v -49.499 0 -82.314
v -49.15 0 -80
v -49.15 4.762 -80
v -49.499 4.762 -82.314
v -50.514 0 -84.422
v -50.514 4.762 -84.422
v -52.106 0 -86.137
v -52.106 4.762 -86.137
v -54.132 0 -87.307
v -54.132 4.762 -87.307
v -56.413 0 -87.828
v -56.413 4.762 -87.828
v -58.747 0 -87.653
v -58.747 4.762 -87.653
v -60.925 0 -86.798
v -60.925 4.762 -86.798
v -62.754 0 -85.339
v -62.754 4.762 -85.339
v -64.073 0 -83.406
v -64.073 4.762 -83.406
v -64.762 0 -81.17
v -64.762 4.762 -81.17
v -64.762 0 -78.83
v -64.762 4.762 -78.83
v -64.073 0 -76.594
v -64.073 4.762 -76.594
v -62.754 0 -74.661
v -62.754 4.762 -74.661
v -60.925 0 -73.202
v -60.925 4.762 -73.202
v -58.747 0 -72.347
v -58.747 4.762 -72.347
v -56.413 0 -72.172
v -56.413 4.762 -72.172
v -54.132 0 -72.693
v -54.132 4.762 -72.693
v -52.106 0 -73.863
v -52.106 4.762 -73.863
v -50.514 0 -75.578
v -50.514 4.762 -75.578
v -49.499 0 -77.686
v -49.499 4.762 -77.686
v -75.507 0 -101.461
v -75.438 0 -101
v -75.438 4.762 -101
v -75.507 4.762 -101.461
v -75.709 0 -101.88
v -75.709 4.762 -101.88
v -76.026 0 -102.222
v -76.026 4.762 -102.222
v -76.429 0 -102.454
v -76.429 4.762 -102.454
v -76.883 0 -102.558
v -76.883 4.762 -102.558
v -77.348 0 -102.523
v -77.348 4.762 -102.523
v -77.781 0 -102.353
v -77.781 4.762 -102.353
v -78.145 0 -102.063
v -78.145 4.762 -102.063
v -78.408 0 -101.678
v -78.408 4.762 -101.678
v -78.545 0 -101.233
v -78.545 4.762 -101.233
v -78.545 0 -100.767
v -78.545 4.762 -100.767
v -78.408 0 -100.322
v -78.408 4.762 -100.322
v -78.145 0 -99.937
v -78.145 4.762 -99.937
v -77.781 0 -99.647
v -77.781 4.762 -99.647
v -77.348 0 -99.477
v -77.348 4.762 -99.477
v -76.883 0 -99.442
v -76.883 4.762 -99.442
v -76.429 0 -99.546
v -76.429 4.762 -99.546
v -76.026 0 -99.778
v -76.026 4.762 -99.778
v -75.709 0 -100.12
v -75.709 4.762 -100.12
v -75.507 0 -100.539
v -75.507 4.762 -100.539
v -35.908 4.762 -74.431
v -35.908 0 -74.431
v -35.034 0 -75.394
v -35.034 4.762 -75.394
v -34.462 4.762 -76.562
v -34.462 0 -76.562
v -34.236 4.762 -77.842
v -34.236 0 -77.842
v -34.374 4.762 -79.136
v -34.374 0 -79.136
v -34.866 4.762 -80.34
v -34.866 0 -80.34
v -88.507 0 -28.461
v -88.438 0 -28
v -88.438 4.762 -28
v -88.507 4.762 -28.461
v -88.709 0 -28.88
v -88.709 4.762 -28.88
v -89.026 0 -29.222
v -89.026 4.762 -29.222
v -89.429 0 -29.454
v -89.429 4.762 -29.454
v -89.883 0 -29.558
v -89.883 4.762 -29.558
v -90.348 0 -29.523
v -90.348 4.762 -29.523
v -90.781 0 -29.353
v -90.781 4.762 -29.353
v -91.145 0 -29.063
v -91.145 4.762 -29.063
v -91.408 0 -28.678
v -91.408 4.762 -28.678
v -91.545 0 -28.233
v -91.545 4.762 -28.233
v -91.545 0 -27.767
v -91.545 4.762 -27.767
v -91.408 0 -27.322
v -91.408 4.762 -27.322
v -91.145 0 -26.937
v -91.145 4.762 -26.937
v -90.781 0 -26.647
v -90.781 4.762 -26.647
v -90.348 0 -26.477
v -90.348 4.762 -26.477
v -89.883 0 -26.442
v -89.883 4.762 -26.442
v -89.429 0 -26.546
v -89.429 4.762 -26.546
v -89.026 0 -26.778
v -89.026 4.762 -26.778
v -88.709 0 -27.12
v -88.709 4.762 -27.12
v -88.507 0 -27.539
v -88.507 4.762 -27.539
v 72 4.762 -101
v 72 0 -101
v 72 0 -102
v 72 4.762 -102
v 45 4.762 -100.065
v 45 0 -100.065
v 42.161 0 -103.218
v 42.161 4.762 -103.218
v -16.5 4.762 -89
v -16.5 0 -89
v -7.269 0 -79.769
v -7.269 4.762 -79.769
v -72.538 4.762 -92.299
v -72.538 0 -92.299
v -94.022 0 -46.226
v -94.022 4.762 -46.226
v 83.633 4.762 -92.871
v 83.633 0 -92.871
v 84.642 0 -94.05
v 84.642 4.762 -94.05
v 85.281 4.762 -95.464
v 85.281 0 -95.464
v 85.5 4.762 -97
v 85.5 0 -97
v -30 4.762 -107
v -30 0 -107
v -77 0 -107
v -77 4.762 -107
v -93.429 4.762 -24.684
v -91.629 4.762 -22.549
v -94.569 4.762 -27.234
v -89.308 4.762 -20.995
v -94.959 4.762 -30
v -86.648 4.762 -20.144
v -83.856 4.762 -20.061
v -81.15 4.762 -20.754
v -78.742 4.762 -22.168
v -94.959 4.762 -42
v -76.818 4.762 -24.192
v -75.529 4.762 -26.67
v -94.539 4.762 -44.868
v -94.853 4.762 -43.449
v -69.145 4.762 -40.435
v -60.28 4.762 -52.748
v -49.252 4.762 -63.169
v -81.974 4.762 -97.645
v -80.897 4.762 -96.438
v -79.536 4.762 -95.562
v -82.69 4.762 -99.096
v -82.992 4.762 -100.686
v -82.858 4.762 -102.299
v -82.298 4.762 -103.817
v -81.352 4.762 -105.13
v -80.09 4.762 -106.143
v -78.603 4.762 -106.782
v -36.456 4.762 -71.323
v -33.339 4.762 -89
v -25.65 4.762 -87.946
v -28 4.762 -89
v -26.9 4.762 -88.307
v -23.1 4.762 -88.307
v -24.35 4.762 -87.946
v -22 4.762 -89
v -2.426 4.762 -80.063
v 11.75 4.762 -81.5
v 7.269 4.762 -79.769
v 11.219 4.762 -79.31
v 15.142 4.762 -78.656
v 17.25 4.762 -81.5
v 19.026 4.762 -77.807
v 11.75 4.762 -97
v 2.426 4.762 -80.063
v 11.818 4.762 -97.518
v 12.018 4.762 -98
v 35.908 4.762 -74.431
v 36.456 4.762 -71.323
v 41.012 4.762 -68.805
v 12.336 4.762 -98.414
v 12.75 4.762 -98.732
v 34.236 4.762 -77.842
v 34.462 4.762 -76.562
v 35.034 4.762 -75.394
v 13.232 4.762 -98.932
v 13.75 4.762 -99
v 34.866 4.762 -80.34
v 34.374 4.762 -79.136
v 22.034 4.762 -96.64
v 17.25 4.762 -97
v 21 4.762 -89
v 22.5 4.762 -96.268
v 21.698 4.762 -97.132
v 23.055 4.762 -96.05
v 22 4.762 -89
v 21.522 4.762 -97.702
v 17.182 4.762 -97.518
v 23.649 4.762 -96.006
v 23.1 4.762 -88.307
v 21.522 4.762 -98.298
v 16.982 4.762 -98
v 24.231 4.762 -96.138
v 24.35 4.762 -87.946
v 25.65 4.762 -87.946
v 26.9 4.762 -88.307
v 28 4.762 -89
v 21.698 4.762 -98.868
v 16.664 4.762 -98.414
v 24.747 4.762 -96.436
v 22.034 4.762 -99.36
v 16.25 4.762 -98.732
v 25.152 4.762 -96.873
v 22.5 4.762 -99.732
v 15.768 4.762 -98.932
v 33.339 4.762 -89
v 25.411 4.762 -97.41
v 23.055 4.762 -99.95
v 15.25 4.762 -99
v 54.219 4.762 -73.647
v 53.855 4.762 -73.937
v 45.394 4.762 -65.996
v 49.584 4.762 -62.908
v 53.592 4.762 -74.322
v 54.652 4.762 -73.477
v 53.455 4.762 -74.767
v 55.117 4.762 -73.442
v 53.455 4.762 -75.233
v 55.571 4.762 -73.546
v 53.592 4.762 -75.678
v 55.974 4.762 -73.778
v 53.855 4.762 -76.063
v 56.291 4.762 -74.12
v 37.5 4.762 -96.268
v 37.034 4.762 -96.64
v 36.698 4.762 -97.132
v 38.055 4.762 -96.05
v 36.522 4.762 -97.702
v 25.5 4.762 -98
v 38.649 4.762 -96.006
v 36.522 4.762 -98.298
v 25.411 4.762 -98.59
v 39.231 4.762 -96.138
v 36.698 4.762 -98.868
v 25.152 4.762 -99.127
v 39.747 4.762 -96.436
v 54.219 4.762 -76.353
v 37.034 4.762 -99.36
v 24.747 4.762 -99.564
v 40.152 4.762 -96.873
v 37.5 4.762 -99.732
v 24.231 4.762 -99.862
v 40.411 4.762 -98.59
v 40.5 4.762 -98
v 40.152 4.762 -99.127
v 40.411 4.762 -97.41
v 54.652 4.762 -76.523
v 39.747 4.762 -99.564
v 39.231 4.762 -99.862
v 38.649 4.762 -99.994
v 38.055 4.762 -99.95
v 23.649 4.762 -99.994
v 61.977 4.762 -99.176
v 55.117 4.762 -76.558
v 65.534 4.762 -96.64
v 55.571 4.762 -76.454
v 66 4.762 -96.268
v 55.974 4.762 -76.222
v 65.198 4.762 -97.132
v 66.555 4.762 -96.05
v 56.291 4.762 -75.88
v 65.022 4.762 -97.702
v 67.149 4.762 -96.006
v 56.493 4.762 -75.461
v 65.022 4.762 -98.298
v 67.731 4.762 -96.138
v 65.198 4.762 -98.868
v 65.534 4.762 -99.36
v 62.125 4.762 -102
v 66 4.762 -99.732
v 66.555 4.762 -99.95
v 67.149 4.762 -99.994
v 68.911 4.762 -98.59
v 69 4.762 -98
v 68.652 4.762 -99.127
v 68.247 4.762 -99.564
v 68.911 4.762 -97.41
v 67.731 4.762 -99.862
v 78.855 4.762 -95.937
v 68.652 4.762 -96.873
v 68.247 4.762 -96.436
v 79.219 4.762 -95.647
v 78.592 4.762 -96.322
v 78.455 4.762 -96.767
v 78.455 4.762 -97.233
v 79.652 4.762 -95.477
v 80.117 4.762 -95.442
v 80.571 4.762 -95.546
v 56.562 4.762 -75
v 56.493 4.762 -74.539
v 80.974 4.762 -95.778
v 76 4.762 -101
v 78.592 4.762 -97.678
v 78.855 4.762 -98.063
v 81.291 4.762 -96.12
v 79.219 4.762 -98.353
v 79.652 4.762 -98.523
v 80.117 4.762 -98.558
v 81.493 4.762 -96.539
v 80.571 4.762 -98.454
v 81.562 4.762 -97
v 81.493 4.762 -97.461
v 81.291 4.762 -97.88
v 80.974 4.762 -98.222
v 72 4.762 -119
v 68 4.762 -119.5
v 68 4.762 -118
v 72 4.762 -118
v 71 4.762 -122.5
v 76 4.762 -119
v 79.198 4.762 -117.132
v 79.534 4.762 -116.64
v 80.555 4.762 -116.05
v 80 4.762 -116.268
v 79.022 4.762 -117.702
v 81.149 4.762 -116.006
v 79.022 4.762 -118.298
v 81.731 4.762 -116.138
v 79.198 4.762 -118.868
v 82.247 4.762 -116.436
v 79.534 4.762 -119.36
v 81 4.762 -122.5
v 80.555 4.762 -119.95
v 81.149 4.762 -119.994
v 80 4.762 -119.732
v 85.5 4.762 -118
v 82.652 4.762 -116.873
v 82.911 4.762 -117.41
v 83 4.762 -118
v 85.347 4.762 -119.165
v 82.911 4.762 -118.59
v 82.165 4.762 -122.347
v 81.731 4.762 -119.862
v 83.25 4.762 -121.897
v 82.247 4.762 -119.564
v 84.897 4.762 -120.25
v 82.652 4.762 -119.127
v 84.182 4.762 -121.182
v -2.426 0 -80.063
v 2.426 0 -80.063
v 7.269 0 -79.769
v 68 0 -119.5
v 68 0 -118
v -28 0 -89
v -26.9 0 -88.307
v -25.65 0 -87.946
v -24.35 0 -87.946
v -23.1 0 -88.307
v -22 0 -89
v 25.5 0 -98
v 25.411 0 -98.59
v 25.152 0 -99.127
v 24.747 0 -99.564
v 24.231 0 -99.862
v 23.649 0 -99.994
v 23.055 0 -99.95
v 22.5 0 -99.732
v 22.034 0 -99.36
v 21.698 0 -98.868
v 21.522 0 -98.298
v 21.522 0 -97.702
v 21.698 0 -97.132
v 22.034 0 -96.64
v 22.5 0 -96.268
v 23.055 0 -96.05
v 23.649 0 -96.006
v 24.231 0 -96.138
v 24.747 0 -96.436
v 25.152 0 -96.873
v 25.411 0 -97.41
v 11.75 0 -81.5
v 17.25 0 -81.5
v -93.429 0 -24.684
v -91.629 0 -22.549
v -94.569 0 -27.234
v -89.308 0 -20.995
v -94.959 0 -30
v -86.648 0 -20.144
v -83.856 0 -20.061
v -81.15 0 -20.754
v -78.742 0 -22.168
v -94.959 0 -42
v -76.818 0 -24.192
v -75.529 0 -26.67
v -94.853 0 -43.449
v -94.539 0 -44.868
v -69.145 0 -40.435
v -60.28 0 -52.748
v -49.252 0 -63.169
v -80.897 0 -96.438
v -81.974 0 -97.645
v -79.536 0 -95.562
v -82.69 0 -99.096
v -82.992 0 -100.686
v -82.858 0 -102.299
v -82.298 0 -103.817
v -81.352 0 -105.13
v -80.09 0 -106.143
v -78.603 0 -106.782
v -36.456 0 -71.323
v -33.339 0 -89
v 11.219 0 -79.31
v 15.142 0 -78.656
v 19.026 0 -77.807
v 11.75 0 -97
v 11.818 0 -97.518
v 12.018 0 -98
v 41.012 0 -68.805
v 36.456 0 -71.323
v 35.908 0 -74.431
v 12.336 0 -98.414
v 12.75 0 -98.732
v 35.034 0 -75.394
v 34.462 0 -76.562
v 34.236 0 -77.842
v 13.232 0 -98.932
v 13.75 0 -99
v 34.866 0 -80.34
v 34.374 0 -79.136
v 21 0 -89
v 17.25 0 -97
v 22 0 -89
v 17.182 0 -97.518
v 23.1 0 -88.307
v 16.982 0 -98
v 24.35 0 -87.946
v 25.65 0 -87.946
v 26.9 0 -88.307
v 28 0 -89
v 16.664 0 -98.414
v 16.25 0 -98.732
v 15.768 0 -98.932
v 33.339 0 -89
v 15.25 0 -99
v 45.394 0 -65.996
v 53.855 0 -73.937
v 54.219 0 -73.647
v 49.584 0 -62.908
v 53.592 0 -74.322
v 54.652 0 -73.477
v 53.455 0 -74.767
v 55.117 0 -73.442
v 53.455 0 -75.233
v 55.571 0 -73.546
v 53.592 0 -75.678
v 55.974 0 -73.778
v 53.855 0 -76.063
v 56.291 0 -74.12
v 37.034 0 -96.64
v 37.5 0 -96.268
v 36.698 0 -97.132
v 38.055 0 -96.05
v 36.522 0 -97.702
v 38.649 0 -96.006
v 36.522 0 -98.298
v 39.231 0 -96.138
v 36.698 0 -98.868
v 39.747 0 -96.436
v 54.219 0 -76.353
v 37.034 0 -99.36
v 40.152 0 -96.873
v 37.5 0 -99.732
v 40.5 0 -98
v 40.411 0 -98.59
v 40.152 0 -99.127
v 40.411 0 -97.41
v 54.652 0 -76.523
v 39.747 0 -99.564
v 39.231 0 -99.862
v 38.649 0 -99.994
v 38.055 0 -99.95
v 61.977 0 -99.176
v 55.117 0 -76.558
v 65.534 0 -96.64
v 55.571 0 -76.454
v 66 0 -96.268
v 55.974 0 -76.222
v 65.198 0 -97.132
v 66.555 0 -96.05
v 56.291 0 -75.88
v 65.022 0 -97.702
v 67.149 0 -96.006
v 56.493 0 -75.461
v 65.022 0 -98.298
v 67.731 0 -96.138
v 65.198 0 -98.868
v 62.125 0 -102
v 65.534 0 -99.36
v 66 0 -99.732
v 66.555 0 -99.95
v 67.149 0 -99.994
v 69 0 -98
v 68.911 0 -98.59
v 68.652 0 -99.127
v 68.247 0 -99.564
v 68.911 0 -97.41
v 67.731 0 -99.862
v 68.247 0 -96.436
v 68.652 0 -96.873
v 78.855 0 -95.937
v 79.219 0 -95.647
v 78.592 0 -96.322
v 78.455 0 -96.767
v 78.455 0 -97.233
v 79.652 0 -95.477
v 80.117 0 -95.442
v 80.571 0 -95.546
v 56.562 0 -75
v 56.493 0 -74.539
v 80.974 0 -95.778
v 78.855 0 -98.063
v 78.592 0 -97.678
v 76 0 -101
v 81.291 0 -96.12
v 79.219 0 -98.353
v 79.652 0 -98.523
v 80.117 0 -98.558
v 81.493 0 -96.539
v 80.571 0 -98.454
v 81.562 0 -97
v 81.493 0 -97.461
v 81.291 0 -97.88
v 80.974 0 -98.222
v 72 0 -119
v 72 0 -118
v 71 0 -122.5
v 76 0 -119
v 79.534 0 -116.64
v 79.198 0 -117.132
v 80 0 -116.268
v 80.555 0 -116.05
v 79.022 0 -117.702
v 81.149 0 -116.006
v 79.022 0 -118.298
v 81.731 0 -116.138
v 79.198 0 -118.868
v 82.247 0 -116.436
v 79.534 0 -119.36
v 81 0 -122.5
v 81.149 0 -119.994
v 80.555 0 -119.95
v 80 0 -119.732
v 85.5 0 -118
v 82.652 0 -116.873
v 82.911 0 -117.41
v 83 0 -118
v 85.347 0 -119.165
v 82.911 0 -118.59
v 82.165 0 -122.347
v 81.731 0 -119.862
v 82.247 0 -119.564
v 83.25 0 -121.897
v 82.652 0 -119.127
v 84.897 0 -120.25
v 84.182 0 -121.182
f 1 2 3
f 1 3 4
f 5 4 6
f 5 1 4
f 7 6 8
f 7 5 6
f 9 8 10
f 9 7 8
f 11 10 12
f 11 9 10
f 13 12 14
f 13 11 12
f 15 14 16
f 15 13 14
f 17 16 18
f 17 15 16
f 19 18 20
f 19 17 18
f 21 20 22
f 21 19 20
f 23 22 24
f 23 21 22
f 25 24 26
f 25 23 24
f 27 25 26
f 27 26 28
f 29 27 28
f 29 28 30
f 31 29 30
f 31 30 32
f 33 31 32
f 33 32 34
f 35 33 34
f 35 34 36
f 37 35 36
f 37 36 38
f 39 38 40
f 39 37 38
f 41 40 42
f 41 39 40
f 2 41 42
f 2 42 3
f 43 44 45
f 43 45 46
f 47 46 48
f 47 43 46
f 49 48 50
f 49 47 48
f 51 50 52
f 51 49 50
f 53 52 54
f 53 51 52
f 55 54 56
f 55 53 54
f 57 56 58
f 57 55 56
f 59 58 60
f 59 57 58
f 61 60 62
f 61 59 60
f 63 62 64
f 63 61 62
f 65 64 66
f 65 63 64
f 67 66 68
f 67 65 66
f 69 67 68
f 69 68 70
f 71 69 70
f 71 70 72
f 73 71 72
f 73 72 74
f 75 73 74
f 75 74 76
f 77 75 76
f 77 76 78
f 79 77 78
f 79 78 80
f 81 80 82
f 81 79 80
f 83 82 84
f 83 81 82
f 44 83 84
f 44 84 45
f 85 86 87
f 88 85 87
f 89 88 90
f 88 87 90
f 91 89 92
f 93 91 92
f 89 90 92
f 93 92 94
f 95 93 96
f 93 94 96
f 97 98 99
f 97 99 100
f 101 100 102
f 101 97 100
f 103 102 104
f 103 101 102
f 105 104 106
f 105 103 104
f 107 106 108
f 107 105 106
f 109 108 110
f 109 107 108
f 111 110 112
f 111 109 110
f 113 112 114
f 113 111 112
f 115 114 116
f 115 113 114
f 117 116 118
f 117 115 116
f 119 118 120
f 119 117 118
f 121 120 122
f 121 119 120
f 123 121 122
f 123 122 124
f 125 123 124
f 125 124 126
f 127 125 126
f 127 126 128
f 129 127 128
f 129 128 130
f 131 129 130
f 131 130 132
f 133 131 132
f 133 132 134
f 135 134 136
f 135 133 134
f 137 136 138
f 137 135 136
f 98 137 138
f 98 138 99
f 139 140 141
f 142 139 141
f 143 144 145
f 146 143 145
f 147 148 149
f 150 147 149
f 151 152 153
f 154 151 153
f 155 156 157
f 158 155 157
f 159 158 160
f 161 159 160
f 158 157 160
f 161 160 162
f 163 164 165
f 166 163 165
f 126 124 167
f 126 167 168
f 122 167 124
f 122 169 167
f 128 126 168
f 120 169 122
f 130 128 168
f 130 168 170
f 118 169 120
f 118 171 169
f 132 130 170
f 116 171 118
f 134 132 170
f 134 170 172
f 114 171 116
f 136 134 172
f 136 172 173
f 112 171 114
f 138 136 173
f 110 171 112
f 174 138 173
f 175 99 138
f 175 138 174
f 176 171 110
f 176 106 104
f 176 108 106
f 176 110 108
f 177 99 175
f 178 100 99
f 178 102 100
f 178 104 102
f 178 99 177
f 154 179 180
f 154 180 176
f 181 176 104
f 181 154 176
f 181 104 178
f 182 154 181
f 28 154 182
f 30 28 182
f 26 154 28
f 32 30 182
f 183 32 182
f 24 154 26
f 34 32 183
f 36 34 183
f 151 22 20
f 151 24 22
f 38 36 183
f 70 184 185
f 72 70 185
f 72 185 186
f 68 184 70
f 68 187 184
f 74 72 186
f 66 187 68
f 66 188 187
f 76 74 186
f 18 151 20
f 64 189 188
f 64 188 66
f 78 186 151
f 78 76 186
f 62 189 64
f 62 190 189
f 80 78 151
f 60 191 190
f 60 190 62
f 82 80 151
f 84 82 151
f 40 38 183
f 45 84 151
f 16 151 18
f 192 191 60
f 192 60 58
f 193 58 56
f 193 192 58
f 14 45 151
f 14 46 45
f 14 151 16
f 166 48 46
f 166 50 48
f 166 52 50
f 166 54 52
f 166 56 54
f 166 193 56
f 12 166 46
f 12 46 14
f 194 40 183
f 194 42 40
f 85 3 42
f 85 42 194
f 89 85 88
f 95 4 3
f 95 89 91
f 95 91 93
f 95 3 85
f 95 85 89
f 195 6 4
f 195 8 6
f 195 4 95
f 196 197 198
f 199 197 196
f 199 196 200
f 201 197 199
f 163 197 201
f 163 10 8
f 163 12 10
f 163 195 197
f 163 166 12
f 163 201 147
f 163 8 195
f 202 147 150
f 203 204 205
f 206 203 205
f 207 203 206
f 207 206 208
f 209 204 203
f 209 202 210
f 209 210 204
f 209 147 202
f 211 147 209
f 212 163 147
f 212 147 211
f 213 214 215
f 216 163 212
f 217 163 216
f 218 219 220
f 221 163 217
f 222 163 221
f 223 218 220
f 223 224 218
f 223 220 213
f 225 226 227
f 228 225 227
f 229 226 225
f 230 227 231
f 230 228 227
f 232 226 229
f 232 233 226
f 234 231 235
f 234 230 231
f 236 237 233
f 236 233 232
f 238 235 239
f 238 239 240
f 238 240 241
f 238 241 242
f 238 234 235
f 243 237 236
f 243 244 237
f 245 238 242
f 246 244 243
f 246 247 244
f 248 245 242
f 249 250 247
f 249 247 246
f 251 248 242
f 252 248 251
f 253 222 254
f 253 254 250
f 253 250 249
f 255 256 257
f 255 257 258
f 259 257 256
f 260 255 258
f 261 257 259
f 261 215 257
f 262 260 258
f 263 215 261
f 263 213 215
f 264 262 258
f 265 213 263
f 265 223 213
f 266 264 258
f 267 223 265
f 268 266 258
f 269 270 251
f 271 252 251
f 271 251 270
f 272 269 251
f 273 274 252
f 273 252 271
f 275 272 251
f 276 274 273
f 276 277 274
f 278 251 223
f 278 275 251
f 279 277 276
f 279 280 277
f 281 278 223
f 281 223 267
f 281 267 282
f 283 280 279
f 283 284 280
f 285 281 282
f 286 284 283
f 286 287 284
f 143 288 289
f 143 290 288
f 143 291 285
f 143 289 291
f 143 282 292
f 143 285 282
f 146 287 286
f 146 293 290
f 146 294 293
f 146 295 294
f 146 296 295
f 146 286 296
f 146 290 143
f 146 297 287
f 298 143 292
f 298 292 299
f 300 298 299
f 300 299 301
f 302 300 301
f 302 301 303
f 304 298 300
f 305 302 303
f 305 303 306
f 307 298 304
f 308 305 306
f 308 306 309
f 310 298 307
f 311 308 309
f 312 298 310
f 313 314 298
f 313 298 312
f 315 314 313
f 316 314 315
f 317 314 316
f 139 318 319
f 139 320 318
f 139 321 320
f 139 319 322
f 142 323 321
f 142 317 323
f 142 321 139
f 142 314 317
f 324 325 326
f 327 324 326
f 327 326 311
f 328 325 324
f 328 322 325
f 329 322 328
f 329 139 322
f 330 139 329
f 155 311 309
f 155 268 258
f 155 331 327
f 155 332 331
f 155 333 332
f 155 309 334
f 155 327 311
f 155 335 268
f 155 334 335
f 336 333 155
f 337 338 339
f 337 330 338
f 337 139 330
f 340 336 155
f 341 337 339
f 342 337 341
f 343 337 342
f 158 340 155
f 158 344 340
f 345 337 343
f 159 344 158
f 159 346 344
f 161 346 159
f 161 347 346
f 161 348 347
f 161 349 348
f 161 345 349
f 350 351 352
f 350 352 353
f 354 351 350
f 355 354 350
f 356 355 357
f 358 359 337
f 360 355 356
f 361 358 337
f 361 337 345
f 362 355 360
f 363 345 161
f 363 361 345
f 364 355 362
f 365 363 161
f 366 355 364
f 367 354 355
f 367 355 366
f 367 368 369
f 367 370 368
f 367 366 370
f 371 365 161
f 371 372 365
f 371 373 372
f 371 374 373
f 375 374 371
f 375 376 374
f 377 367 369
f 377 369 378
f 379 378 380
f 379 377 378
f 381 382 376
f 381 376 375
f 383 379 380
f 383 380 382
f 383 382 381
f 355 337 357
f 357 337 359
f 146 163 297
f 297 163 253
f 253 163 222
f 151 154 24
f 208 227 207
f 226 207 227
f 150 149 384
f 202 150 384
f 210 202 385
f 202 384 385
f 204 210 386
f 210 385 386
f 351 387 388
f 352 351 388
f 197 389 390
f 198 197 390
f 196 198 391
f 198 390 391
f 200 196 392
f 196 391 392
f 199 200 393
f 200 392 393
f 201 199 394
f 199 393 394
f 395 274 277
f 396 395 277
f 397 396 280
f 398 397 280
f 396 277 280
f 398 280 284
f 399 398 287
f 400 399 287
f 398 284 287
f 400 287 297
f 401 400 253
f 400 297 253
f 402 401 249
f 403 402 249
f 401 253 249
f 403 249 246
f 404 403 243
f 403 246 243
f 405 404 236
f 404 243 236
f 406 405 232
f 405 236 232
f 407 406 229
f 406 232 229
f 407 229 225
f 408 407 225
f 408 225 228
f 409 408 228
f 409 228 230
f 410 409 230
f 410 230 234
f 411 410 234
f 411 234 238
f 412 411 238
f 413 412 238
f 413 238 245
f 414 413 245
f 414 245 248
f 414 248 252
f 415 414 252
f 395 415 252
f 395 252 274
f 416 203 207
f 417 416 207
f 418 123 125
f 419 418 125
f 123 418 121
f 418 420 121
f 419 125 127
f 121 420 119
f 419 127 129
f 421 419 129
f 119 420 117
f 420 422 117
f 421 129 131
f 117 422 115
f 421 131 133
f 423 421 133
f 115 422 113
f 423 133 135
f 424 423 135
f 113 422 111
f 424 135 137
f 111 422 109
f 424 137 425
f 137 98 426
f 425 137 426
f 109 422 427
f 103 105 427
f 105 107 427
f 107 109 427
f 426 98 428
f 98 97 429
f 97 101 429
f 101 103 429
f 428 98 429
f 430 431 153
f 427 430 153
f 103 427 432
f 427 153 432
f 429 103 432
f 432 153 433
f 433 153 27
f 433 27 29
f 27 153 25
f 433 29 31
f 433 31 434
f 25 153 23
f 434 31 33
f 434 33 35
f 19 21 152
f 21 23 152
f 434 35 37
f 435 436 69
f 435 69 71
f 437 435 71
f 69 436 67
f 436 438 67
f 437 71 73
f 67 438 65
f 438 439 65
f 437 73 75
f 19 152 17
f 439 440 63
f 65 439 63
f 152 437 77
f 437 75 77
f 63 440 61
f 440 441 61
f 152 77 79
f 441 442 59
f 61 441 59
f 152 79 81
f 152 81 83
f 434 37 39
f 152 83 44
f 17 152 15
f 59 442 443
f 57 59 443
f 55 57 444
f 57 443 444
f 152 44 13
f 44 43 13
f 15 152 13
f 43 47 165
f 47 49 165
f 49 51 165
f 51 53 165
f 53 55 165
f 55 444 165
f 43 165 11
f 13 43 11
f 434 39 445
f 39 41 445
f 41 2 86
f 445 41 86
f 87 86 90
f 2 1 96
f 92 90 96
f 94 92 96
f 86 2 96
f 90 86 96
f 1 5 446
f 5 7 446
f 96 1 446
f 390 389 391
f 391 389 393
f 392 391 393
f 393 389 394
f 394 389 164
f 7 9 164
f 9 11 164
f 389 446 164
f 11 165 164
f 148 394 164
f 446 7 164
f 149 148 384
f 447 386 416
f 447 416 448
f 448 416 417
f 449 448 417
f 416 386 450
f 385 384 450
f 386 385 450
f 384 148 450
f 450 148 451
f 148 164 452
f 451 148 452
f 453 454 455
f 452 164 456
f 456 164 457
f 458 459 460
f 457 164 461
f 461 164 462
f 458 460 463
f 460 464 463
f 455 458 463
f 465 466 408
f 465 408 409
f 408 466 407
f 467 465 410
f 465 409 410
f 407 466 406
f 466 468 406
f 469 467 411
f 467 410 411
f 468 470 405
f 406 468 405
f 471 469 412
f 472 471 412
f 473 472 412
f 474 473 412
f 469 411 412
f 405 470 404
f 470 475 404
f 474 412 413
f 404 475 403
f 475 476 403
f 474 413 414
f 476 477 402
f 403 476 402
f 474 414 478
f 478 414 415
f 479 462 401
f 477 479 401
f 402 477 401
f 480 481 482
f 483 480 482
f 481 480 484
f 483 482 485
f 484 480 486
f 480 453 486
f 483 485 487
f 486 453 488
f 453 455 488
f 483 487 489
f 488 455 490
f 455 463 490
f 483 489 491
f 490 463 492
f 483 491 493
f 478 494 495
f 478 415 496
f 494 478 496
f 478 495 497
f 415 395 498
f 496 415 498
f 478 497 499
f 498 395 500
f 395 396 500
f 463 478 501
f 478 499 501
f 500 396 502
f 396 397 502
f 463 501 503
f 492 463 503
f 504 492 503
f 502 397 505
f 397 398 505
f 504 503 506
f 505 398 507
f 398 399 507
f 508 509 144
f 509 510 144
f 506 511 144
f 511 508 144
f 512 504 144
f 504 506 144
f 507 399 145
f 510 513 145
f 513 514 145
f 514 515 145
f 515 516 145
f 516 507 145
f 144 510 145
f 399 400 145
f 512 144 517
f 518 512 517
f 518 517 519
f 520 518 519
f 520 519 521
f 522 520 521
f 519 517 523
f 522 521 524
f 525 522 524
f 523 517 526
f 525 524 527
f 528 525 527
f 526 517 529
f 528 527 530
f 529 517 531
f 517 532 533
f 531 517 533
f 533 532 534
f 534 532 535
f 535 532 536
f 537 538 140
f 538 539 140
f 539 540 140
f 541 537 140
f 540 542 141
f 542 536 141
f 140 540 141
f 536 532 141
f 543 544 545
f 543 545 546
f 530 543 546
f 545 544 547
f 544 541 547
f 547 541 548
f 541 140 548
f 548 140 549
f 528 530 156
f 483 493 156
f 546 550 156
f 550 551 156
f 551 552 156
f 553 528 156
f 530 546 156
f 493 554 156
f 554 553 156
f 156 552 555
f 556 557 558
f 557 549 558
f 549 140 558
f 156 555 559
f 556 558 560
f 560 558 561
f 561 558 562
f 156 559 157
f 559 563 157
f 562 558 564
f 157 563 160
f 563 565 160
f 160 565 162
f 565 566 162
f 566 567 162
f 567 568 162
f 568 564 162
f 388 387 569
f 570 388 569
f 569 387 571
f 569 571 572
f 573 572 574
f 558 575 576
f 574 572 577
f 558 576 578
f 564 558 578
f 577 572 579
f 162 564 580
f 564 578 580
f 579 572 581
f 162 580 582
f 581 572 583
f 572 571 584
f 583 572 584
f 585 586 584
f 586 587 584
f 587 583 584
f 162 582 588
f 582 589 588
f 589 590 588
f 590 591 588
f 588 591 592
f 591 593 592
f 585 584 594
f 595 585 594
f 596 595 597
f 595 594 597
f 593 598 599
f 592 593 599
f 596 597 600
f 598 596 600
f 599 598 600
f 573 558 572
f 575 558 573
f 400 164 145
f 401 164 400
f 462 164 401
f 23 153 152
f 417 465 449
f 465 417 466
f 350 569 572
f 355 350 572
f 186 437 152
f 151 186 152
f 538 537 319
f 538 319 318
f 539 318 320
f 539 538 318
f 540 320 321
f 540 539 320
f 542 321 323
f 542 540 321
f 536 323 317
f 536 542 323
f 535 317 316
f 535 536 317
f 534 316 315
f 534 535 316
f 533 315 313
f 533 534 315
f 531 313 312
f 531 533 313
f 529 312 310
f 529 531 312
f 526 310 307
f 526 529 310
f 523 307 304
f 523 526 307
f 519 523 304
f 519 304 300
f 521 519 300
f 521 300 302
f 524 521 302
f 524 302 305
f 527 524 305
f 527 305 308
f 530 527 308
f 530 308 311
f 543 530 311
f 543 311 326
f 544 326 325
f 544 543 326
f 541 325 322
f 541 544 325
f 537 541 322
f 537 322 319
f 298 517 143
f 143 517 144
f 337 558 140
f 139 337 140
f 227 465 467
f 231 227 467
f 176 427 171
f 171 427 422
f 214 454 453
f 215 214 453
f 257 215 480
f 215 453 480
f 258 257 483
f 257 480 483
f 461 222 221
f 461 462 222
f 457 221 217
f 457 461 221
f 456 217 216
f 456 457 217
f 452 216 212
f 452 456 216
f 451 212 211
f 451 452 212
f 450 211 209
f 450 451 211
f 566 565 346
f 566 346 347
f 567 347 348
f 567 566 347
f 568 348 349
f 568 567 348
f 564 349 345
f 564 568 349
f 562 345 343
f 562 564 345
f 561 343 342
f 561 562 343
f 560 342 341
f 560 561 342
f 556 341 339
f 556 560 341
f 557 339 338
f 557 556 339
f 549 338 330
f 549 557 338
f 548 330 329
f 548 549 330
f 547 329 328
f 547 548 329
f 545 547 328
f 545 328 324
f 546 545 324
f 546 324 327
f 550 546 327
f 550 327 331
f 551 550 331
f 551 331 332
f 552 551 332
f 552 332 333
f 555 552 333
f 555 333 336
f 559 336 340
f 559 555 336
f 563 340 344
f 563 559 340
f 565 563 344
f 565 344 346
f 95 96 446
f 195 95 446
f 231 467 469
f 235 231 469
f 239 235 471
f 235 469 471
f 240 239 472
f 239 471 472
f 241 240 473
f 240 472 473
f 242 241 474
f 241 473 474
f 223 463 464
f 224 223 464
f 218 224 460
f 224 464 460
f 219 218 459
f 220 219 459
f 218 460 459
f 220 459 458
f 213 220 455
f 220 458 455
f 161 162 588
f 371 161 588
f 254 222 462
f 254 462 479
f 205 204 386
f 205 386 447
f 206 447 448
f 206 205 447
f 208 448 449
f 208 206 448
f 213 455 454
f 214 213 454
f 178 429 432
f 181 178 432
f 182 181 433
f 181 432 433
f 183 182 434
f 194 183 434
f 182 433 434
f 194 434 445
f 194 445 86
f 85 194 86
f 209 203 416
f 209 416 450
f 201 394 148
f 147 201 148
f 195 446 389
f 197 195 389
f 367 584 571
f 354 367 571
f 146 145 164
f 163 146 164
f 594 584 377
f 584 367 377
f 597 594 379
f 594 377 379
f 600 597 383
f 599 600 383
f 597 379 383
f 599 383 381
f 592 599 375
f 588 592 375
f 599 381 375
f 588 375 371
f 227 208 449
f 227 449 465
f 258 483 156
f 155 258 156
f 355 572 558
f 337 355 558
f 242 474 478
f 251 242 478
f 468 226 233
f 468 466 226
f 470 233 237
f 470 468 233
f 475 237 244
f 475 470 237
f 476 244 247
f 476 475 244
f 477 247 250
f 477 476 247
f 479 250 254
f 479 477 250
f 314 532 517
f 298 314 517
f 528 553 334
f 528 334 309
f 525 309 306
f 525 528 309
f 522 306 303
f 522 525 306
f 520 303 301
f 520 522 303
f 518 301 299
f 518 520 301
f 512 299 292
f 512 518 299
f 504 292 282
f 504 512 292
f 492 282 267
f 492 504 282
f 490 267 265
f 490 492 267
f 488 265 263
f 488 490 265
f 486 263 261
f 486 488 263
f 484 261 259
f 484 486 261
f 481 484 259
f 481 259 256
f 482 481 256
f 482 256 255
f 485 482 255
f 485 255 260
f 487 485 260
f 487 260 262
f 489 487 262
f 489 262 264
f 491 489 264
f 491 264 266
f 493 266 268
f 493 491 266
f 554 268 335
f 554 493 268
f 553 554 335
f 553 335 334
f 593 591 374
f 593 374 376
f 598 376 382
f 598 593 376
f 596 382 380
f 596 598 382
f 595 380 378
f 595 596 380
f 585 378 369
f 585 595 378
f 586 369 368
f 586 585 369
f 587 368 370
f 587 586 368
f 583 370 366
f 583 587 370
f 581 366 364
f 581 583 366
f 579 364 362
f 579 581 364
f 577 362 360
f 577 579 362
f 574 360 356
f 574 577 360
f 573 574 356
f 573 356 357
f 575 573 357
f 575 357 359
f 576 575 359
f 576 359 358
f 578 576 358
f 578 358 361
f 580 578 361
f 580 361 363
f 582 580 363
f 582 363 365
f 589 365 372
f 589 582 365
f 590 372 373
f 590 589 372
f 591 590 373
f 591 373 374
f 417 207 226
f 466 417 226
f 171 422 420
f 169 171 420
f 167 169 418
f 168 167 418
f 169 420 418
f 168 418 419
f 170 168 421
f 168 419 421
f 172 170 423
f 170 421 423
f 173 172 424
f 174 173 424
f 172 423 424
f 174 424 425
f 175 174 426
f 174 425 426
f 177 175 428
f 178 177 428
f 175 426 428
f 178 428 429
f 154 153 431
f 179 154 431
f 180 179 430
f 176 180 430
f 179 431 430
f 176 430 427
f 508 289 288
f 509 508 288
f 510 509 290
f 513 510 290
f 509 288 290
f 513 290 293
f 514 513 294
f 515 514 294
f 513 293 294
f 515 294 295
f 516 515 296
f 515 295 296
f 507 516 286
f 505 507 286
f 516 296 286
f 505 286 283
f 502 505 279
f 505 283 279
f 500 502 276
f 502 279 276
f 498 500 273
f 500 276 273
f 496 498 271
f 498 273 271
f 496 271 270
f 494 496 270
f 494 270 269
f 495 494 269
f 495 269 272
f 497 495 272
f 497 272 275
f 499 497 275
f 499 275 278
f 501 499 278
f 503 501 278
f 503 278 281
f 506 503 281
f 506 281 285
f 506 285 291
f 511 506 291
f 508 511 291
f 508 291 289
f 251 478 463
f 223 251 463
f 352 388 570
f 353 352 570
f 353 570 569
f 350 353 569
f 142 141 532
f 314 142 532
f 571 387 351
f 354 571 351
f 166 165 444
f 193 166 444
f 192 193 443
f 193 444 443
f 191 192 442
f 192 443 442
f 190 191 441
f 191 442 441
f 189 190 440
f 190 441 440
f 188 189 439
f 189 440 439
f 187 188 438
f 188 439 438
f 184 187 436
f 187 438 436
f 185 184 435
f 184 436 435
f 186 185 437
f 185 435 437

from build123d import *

# Parameters (mm, degrees)
SKETCH1_R           = 7.85
SKETCH1_R_2         = 1.5625
SKETCH1_R_3         = 2
BOSS_EXTRUDE1_DEPTH = 4.7625
BOSS_EXTRUDE2_DEPTH = 4.7625
SKETCH4_R           = 2
SKETCH4_W           = 5.5
SKETCH4_H           = 17.5
CUT_EXTRUDE1_DEPTH  = 5.7625
CHAMFER1_SIZE       = 3
FILLET1_R           = 4.5
FILLET2_R           = 2


with BuildPart() as part:
    # Sketch1 → Boss-Extrude1 (new body)
    with BuildSketch(Plane(origin=(0, 0, 0), x_dir=(1, 0, 0), z_dir=(0, 1, 0))):
        with BuildLine():
            Line((-36.456035166, 71.322980167), (-35.908059548, 74.43070433))
            ThreePointArc((-35.908059548, 74.43070433), (-34.303826486, 77.194114594), (-34.866170482, 80.339550848))
            Line((-34.866170482, 80.339550848), (-33.339099631, 89))
            Line((-33.339099631, 89), (-28, 89))
            ThreePointArc((-28, 89), (-25, 87.9), (-22, 89))
            Line((-22, 89), (-16.5, 89))
            Line((-16.5, 89), (-7.269449675, 79.769449675))
            ThreePointArc((-7.269449675, 79.769449675), (0, 80.1), (7.269449675, 79.769449675))
            Line((7.269449675, 79.769449675), (16.5, 89))
            Line((16.5, 89), (22, 89))
            ThreePointArc((22, 89), (25, 87.9), (28, 89))
            Line((28, 89), (33.339099631, 89))
            Line((33.339099631, 89), (34.866170482, 80.339550848))
            ThreePointArc((34.866170482, 80.339550848), (34.303826486, 77.194114594), (35.908059548, 74.43070433))
            Line((35.908059548, 74.43070433), (36.456035166, 71.322980167))
            ThreePointArc((36.456035166, 71.322980167), (43.225467457, 67.435665364), (49.584363344, 62.907876389))
            Line((49.584363344, 62.907876389), (83.633453422, 92.871075657))
            ThreePointArc((83.633453422, 92.871075657), (85.011686035, 94.734386818), (85.5, 97))
            Line((85.5, 97), (85.5, 122.5))
            Line((85.5, 122.5), (68, 122.5))
            Line((68, 122.5), (68, 118))
            Line((68, 118), (72, 118))
            Line((72, 118), (72, 119))
            Line((72, 119), (76, 119))
            Line((76, 119), (76, 101))
            Line((76, 101), (72, 101))
            Line((72, 101), (72, 102))
            Line((72, 102), (62.124723238, 102))
            Line((62.124723238, 102), (61.976702091, 99.17558826))
            Line((61.976702091, 99.17558826), (45, 100.065299516))
            Line((45, 100.065299516), (42.161119264, 103.218195989))
            Line((42.161119264, 103.218195989), (-30, 107))
            Line((-30, 107), (-77, 107))
            ThreePointArc((-77, 107), (-82.857776043, 102.298637684), (-79.53570957, 95.562153278))
            Line((-79.53570957, 95.562153278), (-72.537844854, 92.29899537))
            Line((-72.537844854, 92.29899537), (-94.021950273, 46.226182617))
            ThreePointArc((-94.021950273, 46.226182617), (-94.721832474, 44.164396139), (-94.958872403, 42))
            Line((-94.958872403, 42), (-94.958872403, 30))
            ThreePointArc((-94.958872403, 30), (-86.647958542, 20.143682837), (-75.5294748, 26.67036626))
            ThreePointArc((-75.5294748, 26.67036626), (-60.279785939, 52.748055957), (-36.456035166, 71.322980167))
        make_face()
        with Locations((-57, 80)):
            Circle(SKETCH1_R, mode=Mode.SUBTRACT)
        with Locations((80, 97)):
            Circle(SKETCH1_R_2, mode=Mode.SUBTRACT)
        with Locations((-90, 28)):
            Circle(SKETCH1_R_2, mode=Mode.SUBTRACT)
        with Locations((-77, 101)):
            Circle(SKETCH1_R_2, mode=Mode.SUBTRACT)
        with Locations((81, 118)):
            Circle(SKETCH1_R_3, mode=Mode.SUBTRACT)
        with Locations((67, 98)):
            Circle(SKETCH1_R_3, mode=Mode.SUBTRACT)
        with Locations((55, 75)):
            Circle(SKETCH1_R_2, mode=Mode.SUBTRACT)
    extrude(amount=BOSS_EXTRUDE1_DEPTH)

    # Sketch2 → Boss-Extrude2 (add)
    with BuildSketch(Plane(origin=(0, 4.7625, 0), x_dir=(1, 0, 0), z_dir=(0, 1, 0))):
        with BuildLine():
            Line((19.026456742, 77.807479999), (21, 89))
            Line((21, 89), (16.5, 89))
            Line((16.5, 89), (7.269449675, 79.769449675))
            ThreePointArc((7.269449675, 79.769449675), (13.184498656, 79.007461642), (19.026456742, 77.807479999))
        make_face()
    extrude(amount=-BOSS_EXTRUDE2_DEPTH)

    # Sketch4 → Cut-Extrude1 (cut, through all)
    with BuildSketch(Plane(origin=(0, 4.7625, 0), x_dir=(1, 0, 0), z_dir=(0, 1, 0))):
        with Locations((23.5, 98)):
            Circle(SKETCH4_R)
        with Locations((38.5, 98)):
            Circle(SKETCH4_R)
        with Locations((14.5, 90.25)):
            Rectangle(SKETCH4_W, SKETCH4_H)
    extrude(amount=-CUT_EXTRUDE1_DEPTH, mode=Mode.SUBTRACT)

    # Chamfer1
    chamfer1_edges = [part.edges().sort_by_distance(p)[0] for p in [
        (68, 2.38125, -122.5),
    ]]
    chamfer(chamfer1_edges, length=CHAMFER1_SIZE)

    # Fillet1
    fillet1_edges = [part.edges().sort_by_distance(p)[0] for p in [
        (85.5, 2.38125, -122.5),
    ]]
    fillet(fillet1_edges, radius=FILLET1_R)

    # Fillet2
    fillet2_edges = [part.edges().sort_by_distance(p)[0] for p in [
        (17.25, 2.38125, -99),
        (11.75, 2.38125, -99),
    ]]
    fillet(fillet2_edges, radius=FILLET2_R)


solid = part.part
